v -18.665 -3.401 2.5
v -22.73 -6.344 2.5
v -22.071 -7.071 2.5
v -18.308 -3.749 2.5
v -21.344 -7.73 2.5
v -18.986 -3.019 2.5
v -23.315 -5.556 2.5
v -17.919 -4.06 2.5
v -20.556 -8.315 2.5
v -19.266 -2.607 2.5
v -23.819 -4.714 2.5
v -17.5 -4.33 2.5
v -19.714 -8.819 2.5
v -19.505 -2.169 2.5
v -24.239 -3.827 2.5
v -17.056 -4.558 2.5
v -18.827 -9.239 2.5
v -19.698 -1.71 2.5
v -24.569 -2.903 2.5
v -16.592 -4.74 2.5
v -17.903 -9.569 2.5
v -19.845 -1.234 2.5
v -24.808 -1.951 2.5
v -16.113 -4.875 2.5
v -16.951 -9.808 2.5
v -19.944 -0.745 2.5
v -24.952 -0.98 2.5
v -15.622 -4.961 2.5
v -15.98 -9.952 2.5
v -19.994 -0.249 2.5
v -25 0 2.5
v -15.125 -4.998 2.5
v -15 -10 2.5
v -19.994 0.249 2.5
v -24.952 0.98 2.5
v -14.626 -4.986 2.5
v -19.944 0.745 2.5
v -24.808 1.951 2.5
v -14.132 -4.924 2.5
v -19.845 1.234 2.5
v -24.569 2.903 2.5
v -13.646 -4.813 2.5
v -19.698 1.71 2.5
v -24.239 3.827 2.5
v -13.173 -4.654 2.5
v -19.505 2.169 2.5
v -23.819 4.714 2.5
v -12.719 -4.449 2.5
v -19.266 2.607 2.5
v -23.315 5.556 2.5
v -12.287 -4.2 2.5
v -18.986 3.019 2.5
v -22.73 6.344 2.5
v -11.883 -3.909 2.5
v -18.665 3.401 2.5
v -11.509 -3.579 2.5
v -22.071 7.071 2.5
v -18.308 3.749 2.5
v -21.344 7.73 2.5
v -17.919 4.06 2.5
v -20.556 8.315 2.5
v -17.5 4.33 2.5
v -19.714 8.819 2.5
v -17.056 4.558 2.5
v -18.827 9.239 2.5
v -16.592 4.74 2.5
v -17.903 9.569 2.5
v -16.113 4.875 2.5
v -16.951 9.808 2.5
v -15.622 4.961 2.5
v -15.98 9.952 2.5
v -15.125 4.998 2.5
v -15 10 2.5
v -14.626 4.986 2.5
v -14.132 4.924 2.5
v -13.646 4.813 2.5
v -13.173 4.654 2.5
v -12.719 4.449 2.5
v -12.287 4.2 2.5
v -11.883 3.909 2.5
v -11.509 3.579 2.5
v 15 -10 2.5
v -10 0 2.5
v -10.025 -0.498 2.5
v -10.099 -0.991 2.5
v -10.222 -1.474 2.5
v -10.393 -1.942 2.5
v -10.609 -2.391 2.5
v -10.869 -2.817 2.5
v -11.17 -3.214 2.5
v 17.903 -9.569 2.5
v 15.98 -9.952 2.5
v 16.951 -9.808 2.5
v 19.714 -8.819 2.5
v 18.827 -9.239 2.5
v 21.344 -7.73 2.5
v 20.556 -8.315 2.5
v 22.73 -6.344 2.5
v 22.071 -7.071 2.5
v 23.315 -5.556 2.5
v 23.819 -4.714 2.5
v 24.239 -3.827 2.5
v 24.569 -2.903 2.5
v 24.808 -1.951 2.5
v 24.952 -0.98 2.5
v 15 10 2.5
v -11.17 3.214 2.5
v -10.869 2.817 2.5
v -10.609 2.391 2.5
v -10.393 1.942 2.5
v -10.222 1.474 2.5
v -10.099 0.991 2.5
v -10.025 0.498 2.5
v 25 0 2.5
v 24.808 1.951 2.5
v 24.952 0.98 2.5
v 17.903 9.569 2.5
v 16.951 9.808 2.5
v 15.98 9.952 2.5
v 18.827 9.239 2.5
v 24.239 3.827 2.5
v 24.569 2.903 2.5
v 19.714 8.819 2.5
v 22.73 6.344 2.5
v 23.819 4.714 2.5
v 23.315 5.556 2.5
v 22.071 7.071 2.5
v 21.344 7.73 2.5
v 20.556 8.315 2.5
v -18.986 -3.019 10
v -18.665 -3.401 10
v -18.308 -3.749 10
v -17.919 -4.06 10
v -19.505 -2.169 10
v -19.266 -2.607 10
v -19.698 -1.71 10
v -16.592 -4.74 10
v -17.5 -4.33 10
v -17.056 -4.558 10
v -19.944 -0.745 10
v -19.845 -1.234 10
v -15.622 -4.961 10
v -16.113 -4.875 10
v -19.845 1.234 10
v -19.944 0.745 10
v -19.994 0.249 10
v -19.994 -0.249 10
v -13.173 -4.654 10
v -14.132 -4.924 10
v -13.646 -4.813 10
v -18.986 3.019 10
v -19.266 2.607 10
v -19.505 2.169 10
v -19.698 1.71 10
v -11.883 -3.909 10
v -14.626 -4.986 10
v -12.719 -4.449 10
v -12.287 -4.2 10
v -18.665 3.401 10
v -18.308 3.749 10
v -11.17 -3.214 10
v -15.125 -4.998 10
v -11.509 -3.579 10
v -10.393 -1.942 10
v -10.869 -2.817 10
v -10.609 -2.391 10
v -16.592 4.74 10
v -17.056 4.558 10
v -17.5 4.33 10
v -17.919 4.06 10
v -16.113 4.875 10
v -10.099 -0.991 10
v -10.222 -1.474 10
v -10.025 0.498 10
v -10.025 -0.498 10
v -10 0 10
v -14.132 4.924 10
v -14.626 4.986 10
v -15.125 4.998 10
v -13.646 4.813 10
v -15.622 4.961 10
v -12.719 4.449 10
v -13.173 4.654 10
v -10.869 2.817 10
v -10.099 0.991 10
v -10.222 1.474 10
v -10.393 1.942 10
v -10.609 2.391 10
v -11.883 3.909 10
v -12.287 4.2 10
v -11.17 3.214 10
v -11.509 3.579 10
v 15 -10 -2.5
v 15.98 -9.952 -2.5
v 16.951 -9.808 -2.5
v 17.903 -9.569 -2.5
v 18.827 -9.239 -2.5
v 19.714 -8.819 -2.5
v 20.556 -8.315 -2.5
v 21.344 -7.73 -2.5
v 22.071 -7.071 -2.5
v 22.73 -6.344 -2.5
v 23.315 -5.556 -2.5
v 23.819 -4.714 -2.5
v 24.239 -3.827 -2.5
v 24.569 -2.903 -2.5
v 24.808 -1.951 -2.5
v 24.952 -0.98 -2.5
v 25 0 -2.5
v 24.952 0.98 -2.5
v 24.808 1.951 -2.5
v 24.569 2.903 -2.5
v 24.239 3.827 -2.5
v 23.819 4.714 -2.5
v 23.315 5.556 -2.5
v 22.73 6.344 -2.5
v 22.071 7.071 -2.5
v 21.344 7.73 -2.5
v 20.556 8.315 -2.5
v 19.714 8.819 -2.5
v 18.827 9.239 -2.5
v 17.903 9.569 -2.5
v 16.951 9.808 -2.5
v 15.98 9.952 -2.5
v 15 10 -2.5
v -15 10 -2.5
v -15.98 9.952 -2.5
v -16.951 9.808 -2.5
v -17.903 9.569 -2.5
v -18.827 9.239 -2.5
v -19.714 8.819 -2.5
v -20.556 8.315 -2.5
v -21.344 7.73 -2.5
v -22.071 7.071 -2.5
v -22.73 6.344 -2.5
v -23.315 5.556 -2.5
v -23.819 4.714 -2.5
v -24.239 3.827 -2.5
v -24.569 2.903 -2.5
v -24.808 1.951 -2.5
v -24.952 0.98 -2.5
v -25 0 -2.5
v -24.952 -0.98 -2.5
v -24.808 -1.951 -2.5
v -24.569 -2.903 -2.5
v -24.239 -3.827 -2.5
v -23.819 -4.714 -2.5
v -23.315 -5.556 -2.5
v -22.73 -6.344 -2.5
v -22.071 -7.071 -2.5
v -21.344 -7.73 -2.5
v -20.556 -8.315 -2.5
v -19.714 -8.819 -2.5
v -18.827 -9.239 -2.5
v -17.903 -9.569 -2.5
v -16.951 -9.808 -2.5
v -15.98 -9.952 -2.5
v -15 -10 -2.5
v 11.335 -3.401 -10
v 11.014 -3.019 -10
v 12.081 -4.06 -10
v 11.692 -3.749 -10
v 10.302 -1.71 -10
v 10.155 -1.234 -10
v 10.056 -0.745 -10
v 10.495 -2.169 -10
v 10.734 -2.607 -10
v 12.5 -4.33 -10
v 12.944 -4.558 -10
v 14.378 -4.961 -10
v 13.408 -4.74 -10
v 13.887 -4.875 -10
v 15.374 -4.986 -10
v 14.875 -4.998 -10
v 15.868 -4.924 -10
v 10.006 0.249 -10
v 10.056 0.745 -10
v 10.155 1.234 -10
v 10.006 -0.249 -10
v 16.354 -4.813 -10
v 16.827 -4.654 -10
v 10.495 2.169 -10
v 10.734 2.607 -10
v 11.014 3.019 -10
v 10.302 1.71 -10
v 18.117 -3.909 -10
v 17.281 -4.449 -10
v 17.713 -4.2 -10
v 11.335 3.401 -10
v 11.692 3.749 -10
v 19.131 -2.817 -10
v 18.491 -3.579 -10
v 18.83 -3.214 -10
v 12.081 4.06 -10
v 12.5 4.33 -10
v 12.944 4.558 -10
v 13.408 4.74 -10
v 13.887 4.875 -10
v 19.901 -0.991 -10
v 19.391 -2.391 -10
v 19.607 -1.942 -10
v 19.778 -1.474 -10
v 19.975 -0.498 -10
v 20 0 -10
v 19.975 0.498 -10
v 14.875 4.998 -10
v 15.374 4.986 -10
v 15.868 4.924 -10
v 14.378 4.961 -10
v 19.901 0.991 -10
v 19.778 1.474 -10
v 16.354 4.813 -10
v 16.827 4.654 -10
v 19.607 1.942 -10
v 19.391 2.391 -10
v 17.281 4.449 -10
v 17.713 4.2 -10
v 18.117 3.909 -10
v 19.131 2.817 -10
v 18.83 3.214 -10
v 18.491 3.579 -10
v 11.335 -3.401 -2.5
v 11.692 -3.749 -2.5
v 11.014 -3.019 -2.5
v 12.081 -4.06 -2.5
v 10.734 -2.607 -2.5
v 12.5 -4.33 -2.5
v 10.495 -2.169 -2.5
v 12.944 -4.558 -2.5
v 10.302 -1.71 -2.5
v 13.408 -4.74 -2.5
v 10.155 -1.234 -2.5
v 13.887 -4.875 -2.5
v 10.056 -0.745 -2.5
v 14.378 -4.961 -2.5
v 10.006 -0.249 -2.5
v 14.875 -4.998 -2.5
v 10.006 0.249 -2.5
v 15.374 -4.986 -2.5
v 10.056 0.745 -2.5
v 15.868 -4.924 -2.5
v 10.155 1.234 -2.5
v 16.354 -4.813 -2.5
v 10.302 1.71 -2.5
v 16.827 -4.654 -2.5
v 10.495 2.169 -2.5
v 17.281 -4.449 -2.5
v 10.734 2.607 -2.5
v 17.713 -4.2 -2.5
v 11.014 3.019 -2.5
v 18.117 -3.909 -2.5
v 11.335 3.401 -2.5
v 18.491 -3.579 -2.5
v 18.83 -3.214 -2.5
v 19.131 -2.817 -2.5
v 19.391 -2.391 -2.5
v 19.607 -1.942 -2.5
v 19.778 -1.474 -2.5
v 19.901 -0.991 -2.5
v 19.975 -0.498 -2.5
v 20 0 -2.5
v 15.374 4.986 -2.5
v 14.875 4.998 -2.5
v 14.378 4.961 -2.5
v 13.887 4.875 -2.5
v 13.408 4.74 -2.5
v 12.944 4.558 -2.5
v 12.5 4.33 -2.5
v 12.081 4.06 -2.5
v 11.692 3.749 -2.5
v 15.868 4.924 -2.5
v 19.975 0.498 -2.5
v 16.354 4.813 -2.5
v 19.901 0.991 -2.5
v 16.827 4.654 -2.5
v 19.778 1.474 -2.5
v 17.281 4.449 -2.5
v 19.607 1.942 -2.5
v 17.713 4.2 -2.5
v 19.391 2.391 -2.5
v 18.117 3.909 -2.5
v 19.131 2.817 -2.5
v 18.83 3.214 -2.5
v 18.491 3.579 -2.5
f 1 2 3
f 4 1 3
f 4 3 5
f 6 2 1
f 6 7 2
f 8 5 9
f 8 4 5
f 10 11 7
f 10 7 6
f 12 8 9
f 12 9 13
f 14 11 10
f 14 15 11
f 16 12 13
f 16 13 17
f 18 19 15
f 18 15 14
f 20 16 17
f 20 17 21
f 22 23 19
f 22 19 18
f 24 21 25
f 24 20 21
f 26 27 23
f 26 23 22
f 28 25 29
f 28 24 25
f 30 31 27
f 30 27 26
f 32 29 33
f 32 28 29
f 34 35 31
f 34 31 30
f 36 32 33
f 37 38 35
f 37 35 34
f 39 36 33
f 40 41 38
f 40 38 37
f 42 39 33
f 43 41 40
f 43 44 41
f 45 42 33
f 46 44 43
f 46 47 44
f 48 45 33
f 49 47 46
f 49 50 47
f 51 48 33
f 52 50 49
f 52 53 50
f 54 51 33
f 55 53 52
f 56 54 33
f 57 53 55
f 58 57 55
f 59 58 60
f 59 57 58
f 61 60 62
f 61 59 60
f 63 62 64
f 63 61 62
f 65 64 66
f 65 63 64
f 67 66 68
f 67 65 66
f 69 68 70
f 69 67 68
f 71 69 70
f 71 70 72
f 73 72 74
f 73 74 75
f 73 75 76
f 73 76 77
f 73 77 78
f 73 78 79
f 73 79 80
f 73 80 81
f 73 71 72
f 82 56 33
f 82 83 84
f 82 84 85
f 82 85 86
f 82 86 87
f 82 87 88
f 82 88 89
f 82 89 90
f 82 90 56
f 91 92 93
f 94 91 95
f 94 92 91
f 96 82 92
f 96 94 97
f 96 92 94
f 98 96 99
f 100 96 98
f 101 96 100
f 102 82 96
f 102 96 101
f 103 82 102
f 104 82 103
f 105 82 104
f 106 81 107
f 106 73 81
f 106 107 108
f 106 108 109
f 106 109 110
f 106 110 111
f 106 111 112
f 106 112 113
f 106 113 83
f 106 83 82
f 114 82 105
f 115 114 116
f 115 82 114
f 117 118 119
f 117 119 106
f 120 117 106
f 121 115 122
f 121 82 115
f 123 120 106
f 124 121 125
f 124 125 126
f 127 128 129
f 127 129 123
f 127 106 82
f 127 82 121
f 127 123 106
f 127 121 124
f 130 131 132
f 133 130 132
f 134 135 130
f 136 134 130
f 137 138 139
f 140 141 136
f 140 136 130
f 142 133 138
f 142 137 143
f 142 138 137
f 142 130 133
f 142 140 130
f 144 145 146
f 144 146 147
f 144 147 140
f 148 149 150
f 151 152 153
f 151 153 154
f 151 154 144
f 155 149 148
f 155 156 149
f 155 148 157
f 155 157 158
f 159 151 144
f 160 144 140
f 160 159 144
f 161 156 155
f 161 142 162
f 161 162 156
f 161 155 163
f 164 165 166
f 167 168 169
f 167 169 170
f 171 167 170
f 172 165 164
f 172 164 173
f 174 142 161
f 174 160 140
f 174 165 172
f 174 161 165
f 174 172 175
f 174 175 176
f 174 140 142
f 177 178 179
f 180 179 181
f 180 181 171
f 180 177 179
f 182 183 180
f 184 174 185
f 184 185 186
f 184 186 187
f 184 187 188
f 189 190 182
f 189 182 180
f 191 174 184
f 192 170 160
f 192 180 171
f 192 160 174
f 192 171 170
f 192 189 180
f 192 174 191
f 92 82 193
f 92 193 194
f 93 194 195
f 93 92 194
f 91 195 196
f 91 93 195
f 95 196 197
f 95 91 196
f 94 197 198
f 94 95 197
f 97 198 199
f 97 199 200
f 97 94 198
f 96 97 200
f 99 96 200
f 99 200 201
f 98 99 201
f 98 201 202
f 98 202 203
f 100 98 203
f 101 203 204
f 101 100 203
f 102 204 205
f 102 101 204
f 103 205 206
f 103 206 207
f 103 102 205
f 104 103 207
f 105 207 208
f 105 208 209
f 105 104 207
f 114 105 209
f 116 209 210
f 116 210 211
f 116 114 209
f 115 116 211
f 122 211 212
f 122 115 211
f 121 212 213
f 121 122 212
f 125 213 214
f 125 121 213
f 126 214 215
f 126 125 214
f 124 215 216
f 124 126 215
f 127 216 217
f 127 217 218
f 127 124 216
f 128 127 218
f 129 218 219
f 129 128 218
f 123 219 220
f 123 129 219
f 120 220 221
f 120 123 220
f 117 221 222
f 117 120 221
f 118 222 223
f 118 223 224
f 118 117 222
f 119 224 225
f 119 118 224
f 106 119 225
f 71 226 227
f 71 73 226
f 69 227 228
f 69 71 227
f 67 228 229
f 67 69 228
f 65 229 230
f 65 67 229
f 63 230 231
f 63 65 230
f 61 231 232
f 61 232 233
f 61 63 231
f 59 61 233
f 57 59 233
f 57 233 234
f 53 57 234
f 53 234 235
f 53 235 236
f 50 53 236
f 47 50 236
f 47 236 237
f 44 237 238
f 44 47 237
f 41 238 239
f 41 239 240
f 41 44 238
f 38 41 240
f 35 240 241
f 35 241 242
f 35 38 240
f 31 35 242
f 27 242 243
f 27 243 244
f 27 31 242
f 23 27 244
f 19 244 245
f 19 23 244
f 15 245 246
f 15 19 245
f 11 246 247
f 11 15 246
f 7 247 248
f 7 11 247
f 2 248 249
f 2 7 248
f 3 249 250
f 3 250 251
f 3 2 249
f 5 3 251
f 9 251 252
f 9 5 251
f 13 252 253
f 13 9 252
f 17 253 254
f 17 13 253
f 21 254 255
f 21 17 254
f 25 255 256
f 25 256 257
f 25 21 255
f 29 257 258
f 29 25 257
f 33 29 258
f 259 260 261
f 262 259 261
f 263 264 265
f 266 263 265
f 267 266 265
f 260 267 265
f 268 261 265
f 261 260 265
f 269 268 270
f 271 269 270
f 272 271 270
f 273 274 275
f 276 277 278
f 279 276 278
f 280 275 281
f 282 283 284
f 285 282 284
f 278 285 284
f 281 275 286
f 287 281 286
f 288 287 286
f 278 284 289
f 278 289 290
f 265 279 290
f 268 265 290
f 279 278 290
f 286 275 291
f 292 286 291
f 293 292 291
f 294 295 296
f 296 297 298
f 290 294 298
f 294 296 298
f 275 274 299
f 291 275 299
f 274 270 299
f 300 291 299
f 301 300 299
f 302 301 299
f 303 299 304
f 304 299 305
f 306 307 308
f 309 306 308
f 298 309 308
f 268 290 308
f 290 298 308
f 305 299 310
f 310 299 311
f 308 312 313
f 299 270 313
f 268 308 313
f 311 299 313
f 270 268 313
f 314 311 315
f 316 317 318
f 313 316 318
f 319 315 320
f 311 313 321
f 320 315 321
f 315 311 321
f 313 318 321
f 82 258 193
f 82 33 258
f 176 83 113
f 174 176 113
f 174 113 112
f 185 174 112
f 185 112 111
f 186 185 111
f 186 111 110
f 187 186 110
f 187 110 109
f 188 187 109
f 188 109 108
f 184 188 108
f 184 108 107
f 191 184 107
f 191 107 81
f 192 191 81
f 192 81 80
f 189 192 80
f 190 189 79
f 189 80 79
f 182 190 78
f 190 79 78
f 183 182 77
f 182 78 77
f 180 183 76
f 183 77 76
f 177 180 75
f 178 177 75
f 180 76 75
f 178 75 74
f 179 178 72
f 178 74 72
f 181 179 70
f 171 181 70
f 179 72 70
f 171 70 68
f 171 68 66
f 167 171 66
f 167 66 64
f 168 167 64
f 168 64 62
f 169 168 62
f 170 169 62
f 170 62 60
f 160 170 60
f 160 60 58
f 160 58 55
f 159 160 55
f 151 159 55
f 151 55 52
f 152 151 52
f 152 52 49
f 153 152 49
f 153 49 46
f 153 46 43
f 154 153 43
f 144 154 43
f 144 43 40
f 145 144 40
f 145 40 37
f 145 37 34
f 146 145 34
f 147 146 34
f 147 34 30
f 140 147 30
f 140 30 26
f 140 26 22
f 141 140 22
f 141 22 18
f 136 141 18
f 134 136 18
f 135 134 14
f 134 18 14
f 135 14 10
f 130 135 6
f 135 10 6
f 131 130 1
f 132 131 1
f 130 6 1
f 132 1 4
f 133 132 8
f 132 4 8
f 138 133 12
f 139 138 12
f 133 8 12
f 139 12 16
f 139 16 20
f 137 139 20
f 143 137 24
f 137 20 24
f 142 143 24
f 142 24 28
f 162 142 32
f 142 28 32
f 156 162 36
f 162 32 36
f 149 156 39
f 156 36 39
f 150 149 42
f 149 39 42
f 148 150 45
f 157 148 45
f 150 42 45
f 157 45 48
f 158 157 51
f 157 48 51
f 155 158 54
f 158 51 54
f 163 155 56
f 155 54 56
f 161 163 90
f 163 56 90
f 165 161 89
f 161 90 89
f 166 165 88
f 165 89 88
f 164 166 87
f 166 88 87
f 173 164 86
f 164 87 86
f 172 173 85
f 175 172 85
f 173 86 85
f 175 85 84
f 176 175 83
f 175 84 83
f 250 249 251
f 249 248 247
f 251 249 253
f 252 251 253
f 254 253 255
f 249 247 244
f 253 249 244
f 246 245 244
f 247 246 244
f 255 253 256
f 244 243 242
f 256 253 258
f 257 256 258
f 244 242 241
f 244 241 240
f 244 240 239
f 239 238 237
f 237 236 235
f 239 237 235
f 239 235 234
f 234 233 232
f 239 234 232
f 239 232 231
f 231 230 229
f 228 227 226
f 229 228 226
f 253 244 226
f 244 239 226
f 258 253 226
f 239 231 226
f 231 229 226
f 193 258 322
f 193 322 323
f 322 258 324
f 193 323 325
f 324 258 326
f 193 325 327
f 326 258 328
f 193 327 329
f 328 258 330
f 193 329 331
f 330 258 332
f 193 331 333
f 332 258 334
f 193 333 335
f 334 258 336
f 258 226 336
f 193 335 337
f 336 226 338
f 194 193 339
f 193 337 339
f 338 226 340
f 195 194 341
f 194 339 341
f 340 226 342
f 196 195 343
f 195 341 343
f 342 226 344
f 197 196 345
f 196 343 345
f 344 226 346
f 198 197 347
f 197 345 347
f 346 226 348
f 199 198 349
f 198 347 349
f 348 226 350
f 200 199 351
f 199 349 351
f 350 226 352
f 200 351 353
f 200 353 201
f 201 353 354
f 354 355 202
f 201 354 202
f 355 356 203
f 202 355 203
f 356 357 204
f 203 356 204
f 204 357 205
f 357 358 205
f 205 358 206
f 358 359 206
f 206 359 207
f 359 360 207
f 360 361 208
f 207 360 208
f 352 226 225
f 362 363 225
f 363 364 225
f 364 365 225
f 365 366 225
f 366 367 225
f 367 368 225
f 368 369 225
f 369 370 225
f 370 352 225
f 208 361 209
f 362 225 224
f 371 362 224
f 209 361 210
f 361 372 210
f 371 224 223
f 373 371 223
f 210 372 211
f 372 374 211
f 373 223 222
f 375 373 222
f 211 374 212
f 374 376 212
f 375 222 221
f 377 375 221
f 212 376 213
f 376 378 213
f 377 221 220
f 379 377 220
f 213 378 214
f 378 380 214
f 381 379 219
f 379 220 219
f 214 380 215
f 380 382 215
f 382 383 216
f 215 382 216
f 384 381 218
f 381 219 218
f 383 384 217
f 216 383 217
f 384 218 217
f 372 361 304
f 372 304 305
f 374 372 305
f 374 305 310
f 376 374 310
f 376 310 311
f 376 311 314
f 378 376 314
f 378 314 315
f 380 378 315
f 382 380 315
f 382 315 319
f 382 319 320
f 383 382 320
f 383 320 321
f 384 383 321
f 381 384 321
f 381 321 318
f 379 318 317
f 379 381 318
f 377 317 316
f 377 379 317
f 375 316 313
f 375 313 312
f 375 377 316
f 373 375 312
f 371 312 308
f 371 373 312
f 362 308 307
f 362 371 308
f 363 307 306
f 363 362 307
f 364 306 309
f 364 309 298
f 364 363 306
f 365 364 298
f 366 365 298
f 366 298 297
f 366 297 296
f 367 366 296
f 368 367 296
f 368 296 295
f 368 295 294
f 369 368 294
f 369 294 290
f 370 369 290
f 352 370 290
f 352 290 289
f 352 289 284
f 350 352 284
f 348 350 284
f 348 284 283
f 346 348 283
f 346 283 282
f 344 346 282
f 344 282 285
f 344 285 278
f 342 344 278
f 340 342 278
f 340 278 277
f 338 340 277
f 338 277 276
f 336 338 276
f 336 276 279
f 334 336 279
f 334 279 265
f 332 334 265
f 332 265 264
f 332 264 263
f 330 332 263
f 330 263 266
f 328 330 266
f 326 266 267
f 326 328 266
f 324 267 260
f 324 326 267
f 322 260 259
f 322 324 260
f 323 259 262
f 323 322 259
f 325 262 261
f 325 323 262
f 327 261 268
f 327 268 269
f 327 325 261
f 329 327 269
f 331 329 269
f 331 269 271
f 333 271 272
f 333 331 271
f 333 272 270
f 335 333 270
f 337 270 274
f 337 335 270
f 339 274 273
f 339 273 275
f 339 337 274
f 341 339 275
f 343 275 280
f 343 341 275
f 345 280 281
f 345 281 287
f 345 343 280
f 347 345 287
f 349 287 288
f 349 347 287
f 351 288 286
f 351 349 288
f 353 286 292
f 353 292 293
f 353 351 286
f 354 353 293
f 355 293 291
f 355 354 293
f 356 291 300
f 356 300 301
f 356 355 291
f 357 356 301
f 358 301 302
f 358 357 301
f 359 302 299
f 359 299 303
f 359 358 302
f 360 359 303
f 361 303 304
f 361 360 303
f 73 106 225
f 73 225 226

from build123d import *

# Parameters (mm, degrees)
F0_R     = 5
F1_DEPTH = 2.5
F2_DEPTH = 10
F3_DEPTH = 10


with BuildPart() as f1:
    # F0 (on Top) → F1 (new body, symmetric)
    with BuildSketch(Plane.XY):
        with BuildLine():
            Line((-15, -10), (15, -10))
            ThreePointArc((15, -10), (25, 0), (15, 10))
            Line((15, 10), (-15, 10))
            ThreePointArc((-15, 10), (-25, 0), (-15, -10))
        make_face()
        with Locations((-15, 0)):
            Circle(F0_R, mode=Mode.SUBTRACT)
        with Locations((15, 0)):
            Circle(F0_R, mode=Mode.SUBTRACT)
        with Locations((-15, 0)):
            Circle(F0_R)
        with Locations((15, 0)):
            Circle(F0_R)
    extrude(amount=F1_DEPTH, both=True)

    # F0 (on Top) → F2 (join)
    with BuildSketch(Plane.XY):
        with Locations((-15, 0)):
            Circle(F0_R)
    extrude(amount=F2_DEPTH)

    # F0 (on Top) → F3 (join)
    with BuildSketch(Plane.XY):
        with Locations((15, 0)):
            Circle(F0_R)
    extrude(amount=-F3_DEPTH)


solid = f1.part
